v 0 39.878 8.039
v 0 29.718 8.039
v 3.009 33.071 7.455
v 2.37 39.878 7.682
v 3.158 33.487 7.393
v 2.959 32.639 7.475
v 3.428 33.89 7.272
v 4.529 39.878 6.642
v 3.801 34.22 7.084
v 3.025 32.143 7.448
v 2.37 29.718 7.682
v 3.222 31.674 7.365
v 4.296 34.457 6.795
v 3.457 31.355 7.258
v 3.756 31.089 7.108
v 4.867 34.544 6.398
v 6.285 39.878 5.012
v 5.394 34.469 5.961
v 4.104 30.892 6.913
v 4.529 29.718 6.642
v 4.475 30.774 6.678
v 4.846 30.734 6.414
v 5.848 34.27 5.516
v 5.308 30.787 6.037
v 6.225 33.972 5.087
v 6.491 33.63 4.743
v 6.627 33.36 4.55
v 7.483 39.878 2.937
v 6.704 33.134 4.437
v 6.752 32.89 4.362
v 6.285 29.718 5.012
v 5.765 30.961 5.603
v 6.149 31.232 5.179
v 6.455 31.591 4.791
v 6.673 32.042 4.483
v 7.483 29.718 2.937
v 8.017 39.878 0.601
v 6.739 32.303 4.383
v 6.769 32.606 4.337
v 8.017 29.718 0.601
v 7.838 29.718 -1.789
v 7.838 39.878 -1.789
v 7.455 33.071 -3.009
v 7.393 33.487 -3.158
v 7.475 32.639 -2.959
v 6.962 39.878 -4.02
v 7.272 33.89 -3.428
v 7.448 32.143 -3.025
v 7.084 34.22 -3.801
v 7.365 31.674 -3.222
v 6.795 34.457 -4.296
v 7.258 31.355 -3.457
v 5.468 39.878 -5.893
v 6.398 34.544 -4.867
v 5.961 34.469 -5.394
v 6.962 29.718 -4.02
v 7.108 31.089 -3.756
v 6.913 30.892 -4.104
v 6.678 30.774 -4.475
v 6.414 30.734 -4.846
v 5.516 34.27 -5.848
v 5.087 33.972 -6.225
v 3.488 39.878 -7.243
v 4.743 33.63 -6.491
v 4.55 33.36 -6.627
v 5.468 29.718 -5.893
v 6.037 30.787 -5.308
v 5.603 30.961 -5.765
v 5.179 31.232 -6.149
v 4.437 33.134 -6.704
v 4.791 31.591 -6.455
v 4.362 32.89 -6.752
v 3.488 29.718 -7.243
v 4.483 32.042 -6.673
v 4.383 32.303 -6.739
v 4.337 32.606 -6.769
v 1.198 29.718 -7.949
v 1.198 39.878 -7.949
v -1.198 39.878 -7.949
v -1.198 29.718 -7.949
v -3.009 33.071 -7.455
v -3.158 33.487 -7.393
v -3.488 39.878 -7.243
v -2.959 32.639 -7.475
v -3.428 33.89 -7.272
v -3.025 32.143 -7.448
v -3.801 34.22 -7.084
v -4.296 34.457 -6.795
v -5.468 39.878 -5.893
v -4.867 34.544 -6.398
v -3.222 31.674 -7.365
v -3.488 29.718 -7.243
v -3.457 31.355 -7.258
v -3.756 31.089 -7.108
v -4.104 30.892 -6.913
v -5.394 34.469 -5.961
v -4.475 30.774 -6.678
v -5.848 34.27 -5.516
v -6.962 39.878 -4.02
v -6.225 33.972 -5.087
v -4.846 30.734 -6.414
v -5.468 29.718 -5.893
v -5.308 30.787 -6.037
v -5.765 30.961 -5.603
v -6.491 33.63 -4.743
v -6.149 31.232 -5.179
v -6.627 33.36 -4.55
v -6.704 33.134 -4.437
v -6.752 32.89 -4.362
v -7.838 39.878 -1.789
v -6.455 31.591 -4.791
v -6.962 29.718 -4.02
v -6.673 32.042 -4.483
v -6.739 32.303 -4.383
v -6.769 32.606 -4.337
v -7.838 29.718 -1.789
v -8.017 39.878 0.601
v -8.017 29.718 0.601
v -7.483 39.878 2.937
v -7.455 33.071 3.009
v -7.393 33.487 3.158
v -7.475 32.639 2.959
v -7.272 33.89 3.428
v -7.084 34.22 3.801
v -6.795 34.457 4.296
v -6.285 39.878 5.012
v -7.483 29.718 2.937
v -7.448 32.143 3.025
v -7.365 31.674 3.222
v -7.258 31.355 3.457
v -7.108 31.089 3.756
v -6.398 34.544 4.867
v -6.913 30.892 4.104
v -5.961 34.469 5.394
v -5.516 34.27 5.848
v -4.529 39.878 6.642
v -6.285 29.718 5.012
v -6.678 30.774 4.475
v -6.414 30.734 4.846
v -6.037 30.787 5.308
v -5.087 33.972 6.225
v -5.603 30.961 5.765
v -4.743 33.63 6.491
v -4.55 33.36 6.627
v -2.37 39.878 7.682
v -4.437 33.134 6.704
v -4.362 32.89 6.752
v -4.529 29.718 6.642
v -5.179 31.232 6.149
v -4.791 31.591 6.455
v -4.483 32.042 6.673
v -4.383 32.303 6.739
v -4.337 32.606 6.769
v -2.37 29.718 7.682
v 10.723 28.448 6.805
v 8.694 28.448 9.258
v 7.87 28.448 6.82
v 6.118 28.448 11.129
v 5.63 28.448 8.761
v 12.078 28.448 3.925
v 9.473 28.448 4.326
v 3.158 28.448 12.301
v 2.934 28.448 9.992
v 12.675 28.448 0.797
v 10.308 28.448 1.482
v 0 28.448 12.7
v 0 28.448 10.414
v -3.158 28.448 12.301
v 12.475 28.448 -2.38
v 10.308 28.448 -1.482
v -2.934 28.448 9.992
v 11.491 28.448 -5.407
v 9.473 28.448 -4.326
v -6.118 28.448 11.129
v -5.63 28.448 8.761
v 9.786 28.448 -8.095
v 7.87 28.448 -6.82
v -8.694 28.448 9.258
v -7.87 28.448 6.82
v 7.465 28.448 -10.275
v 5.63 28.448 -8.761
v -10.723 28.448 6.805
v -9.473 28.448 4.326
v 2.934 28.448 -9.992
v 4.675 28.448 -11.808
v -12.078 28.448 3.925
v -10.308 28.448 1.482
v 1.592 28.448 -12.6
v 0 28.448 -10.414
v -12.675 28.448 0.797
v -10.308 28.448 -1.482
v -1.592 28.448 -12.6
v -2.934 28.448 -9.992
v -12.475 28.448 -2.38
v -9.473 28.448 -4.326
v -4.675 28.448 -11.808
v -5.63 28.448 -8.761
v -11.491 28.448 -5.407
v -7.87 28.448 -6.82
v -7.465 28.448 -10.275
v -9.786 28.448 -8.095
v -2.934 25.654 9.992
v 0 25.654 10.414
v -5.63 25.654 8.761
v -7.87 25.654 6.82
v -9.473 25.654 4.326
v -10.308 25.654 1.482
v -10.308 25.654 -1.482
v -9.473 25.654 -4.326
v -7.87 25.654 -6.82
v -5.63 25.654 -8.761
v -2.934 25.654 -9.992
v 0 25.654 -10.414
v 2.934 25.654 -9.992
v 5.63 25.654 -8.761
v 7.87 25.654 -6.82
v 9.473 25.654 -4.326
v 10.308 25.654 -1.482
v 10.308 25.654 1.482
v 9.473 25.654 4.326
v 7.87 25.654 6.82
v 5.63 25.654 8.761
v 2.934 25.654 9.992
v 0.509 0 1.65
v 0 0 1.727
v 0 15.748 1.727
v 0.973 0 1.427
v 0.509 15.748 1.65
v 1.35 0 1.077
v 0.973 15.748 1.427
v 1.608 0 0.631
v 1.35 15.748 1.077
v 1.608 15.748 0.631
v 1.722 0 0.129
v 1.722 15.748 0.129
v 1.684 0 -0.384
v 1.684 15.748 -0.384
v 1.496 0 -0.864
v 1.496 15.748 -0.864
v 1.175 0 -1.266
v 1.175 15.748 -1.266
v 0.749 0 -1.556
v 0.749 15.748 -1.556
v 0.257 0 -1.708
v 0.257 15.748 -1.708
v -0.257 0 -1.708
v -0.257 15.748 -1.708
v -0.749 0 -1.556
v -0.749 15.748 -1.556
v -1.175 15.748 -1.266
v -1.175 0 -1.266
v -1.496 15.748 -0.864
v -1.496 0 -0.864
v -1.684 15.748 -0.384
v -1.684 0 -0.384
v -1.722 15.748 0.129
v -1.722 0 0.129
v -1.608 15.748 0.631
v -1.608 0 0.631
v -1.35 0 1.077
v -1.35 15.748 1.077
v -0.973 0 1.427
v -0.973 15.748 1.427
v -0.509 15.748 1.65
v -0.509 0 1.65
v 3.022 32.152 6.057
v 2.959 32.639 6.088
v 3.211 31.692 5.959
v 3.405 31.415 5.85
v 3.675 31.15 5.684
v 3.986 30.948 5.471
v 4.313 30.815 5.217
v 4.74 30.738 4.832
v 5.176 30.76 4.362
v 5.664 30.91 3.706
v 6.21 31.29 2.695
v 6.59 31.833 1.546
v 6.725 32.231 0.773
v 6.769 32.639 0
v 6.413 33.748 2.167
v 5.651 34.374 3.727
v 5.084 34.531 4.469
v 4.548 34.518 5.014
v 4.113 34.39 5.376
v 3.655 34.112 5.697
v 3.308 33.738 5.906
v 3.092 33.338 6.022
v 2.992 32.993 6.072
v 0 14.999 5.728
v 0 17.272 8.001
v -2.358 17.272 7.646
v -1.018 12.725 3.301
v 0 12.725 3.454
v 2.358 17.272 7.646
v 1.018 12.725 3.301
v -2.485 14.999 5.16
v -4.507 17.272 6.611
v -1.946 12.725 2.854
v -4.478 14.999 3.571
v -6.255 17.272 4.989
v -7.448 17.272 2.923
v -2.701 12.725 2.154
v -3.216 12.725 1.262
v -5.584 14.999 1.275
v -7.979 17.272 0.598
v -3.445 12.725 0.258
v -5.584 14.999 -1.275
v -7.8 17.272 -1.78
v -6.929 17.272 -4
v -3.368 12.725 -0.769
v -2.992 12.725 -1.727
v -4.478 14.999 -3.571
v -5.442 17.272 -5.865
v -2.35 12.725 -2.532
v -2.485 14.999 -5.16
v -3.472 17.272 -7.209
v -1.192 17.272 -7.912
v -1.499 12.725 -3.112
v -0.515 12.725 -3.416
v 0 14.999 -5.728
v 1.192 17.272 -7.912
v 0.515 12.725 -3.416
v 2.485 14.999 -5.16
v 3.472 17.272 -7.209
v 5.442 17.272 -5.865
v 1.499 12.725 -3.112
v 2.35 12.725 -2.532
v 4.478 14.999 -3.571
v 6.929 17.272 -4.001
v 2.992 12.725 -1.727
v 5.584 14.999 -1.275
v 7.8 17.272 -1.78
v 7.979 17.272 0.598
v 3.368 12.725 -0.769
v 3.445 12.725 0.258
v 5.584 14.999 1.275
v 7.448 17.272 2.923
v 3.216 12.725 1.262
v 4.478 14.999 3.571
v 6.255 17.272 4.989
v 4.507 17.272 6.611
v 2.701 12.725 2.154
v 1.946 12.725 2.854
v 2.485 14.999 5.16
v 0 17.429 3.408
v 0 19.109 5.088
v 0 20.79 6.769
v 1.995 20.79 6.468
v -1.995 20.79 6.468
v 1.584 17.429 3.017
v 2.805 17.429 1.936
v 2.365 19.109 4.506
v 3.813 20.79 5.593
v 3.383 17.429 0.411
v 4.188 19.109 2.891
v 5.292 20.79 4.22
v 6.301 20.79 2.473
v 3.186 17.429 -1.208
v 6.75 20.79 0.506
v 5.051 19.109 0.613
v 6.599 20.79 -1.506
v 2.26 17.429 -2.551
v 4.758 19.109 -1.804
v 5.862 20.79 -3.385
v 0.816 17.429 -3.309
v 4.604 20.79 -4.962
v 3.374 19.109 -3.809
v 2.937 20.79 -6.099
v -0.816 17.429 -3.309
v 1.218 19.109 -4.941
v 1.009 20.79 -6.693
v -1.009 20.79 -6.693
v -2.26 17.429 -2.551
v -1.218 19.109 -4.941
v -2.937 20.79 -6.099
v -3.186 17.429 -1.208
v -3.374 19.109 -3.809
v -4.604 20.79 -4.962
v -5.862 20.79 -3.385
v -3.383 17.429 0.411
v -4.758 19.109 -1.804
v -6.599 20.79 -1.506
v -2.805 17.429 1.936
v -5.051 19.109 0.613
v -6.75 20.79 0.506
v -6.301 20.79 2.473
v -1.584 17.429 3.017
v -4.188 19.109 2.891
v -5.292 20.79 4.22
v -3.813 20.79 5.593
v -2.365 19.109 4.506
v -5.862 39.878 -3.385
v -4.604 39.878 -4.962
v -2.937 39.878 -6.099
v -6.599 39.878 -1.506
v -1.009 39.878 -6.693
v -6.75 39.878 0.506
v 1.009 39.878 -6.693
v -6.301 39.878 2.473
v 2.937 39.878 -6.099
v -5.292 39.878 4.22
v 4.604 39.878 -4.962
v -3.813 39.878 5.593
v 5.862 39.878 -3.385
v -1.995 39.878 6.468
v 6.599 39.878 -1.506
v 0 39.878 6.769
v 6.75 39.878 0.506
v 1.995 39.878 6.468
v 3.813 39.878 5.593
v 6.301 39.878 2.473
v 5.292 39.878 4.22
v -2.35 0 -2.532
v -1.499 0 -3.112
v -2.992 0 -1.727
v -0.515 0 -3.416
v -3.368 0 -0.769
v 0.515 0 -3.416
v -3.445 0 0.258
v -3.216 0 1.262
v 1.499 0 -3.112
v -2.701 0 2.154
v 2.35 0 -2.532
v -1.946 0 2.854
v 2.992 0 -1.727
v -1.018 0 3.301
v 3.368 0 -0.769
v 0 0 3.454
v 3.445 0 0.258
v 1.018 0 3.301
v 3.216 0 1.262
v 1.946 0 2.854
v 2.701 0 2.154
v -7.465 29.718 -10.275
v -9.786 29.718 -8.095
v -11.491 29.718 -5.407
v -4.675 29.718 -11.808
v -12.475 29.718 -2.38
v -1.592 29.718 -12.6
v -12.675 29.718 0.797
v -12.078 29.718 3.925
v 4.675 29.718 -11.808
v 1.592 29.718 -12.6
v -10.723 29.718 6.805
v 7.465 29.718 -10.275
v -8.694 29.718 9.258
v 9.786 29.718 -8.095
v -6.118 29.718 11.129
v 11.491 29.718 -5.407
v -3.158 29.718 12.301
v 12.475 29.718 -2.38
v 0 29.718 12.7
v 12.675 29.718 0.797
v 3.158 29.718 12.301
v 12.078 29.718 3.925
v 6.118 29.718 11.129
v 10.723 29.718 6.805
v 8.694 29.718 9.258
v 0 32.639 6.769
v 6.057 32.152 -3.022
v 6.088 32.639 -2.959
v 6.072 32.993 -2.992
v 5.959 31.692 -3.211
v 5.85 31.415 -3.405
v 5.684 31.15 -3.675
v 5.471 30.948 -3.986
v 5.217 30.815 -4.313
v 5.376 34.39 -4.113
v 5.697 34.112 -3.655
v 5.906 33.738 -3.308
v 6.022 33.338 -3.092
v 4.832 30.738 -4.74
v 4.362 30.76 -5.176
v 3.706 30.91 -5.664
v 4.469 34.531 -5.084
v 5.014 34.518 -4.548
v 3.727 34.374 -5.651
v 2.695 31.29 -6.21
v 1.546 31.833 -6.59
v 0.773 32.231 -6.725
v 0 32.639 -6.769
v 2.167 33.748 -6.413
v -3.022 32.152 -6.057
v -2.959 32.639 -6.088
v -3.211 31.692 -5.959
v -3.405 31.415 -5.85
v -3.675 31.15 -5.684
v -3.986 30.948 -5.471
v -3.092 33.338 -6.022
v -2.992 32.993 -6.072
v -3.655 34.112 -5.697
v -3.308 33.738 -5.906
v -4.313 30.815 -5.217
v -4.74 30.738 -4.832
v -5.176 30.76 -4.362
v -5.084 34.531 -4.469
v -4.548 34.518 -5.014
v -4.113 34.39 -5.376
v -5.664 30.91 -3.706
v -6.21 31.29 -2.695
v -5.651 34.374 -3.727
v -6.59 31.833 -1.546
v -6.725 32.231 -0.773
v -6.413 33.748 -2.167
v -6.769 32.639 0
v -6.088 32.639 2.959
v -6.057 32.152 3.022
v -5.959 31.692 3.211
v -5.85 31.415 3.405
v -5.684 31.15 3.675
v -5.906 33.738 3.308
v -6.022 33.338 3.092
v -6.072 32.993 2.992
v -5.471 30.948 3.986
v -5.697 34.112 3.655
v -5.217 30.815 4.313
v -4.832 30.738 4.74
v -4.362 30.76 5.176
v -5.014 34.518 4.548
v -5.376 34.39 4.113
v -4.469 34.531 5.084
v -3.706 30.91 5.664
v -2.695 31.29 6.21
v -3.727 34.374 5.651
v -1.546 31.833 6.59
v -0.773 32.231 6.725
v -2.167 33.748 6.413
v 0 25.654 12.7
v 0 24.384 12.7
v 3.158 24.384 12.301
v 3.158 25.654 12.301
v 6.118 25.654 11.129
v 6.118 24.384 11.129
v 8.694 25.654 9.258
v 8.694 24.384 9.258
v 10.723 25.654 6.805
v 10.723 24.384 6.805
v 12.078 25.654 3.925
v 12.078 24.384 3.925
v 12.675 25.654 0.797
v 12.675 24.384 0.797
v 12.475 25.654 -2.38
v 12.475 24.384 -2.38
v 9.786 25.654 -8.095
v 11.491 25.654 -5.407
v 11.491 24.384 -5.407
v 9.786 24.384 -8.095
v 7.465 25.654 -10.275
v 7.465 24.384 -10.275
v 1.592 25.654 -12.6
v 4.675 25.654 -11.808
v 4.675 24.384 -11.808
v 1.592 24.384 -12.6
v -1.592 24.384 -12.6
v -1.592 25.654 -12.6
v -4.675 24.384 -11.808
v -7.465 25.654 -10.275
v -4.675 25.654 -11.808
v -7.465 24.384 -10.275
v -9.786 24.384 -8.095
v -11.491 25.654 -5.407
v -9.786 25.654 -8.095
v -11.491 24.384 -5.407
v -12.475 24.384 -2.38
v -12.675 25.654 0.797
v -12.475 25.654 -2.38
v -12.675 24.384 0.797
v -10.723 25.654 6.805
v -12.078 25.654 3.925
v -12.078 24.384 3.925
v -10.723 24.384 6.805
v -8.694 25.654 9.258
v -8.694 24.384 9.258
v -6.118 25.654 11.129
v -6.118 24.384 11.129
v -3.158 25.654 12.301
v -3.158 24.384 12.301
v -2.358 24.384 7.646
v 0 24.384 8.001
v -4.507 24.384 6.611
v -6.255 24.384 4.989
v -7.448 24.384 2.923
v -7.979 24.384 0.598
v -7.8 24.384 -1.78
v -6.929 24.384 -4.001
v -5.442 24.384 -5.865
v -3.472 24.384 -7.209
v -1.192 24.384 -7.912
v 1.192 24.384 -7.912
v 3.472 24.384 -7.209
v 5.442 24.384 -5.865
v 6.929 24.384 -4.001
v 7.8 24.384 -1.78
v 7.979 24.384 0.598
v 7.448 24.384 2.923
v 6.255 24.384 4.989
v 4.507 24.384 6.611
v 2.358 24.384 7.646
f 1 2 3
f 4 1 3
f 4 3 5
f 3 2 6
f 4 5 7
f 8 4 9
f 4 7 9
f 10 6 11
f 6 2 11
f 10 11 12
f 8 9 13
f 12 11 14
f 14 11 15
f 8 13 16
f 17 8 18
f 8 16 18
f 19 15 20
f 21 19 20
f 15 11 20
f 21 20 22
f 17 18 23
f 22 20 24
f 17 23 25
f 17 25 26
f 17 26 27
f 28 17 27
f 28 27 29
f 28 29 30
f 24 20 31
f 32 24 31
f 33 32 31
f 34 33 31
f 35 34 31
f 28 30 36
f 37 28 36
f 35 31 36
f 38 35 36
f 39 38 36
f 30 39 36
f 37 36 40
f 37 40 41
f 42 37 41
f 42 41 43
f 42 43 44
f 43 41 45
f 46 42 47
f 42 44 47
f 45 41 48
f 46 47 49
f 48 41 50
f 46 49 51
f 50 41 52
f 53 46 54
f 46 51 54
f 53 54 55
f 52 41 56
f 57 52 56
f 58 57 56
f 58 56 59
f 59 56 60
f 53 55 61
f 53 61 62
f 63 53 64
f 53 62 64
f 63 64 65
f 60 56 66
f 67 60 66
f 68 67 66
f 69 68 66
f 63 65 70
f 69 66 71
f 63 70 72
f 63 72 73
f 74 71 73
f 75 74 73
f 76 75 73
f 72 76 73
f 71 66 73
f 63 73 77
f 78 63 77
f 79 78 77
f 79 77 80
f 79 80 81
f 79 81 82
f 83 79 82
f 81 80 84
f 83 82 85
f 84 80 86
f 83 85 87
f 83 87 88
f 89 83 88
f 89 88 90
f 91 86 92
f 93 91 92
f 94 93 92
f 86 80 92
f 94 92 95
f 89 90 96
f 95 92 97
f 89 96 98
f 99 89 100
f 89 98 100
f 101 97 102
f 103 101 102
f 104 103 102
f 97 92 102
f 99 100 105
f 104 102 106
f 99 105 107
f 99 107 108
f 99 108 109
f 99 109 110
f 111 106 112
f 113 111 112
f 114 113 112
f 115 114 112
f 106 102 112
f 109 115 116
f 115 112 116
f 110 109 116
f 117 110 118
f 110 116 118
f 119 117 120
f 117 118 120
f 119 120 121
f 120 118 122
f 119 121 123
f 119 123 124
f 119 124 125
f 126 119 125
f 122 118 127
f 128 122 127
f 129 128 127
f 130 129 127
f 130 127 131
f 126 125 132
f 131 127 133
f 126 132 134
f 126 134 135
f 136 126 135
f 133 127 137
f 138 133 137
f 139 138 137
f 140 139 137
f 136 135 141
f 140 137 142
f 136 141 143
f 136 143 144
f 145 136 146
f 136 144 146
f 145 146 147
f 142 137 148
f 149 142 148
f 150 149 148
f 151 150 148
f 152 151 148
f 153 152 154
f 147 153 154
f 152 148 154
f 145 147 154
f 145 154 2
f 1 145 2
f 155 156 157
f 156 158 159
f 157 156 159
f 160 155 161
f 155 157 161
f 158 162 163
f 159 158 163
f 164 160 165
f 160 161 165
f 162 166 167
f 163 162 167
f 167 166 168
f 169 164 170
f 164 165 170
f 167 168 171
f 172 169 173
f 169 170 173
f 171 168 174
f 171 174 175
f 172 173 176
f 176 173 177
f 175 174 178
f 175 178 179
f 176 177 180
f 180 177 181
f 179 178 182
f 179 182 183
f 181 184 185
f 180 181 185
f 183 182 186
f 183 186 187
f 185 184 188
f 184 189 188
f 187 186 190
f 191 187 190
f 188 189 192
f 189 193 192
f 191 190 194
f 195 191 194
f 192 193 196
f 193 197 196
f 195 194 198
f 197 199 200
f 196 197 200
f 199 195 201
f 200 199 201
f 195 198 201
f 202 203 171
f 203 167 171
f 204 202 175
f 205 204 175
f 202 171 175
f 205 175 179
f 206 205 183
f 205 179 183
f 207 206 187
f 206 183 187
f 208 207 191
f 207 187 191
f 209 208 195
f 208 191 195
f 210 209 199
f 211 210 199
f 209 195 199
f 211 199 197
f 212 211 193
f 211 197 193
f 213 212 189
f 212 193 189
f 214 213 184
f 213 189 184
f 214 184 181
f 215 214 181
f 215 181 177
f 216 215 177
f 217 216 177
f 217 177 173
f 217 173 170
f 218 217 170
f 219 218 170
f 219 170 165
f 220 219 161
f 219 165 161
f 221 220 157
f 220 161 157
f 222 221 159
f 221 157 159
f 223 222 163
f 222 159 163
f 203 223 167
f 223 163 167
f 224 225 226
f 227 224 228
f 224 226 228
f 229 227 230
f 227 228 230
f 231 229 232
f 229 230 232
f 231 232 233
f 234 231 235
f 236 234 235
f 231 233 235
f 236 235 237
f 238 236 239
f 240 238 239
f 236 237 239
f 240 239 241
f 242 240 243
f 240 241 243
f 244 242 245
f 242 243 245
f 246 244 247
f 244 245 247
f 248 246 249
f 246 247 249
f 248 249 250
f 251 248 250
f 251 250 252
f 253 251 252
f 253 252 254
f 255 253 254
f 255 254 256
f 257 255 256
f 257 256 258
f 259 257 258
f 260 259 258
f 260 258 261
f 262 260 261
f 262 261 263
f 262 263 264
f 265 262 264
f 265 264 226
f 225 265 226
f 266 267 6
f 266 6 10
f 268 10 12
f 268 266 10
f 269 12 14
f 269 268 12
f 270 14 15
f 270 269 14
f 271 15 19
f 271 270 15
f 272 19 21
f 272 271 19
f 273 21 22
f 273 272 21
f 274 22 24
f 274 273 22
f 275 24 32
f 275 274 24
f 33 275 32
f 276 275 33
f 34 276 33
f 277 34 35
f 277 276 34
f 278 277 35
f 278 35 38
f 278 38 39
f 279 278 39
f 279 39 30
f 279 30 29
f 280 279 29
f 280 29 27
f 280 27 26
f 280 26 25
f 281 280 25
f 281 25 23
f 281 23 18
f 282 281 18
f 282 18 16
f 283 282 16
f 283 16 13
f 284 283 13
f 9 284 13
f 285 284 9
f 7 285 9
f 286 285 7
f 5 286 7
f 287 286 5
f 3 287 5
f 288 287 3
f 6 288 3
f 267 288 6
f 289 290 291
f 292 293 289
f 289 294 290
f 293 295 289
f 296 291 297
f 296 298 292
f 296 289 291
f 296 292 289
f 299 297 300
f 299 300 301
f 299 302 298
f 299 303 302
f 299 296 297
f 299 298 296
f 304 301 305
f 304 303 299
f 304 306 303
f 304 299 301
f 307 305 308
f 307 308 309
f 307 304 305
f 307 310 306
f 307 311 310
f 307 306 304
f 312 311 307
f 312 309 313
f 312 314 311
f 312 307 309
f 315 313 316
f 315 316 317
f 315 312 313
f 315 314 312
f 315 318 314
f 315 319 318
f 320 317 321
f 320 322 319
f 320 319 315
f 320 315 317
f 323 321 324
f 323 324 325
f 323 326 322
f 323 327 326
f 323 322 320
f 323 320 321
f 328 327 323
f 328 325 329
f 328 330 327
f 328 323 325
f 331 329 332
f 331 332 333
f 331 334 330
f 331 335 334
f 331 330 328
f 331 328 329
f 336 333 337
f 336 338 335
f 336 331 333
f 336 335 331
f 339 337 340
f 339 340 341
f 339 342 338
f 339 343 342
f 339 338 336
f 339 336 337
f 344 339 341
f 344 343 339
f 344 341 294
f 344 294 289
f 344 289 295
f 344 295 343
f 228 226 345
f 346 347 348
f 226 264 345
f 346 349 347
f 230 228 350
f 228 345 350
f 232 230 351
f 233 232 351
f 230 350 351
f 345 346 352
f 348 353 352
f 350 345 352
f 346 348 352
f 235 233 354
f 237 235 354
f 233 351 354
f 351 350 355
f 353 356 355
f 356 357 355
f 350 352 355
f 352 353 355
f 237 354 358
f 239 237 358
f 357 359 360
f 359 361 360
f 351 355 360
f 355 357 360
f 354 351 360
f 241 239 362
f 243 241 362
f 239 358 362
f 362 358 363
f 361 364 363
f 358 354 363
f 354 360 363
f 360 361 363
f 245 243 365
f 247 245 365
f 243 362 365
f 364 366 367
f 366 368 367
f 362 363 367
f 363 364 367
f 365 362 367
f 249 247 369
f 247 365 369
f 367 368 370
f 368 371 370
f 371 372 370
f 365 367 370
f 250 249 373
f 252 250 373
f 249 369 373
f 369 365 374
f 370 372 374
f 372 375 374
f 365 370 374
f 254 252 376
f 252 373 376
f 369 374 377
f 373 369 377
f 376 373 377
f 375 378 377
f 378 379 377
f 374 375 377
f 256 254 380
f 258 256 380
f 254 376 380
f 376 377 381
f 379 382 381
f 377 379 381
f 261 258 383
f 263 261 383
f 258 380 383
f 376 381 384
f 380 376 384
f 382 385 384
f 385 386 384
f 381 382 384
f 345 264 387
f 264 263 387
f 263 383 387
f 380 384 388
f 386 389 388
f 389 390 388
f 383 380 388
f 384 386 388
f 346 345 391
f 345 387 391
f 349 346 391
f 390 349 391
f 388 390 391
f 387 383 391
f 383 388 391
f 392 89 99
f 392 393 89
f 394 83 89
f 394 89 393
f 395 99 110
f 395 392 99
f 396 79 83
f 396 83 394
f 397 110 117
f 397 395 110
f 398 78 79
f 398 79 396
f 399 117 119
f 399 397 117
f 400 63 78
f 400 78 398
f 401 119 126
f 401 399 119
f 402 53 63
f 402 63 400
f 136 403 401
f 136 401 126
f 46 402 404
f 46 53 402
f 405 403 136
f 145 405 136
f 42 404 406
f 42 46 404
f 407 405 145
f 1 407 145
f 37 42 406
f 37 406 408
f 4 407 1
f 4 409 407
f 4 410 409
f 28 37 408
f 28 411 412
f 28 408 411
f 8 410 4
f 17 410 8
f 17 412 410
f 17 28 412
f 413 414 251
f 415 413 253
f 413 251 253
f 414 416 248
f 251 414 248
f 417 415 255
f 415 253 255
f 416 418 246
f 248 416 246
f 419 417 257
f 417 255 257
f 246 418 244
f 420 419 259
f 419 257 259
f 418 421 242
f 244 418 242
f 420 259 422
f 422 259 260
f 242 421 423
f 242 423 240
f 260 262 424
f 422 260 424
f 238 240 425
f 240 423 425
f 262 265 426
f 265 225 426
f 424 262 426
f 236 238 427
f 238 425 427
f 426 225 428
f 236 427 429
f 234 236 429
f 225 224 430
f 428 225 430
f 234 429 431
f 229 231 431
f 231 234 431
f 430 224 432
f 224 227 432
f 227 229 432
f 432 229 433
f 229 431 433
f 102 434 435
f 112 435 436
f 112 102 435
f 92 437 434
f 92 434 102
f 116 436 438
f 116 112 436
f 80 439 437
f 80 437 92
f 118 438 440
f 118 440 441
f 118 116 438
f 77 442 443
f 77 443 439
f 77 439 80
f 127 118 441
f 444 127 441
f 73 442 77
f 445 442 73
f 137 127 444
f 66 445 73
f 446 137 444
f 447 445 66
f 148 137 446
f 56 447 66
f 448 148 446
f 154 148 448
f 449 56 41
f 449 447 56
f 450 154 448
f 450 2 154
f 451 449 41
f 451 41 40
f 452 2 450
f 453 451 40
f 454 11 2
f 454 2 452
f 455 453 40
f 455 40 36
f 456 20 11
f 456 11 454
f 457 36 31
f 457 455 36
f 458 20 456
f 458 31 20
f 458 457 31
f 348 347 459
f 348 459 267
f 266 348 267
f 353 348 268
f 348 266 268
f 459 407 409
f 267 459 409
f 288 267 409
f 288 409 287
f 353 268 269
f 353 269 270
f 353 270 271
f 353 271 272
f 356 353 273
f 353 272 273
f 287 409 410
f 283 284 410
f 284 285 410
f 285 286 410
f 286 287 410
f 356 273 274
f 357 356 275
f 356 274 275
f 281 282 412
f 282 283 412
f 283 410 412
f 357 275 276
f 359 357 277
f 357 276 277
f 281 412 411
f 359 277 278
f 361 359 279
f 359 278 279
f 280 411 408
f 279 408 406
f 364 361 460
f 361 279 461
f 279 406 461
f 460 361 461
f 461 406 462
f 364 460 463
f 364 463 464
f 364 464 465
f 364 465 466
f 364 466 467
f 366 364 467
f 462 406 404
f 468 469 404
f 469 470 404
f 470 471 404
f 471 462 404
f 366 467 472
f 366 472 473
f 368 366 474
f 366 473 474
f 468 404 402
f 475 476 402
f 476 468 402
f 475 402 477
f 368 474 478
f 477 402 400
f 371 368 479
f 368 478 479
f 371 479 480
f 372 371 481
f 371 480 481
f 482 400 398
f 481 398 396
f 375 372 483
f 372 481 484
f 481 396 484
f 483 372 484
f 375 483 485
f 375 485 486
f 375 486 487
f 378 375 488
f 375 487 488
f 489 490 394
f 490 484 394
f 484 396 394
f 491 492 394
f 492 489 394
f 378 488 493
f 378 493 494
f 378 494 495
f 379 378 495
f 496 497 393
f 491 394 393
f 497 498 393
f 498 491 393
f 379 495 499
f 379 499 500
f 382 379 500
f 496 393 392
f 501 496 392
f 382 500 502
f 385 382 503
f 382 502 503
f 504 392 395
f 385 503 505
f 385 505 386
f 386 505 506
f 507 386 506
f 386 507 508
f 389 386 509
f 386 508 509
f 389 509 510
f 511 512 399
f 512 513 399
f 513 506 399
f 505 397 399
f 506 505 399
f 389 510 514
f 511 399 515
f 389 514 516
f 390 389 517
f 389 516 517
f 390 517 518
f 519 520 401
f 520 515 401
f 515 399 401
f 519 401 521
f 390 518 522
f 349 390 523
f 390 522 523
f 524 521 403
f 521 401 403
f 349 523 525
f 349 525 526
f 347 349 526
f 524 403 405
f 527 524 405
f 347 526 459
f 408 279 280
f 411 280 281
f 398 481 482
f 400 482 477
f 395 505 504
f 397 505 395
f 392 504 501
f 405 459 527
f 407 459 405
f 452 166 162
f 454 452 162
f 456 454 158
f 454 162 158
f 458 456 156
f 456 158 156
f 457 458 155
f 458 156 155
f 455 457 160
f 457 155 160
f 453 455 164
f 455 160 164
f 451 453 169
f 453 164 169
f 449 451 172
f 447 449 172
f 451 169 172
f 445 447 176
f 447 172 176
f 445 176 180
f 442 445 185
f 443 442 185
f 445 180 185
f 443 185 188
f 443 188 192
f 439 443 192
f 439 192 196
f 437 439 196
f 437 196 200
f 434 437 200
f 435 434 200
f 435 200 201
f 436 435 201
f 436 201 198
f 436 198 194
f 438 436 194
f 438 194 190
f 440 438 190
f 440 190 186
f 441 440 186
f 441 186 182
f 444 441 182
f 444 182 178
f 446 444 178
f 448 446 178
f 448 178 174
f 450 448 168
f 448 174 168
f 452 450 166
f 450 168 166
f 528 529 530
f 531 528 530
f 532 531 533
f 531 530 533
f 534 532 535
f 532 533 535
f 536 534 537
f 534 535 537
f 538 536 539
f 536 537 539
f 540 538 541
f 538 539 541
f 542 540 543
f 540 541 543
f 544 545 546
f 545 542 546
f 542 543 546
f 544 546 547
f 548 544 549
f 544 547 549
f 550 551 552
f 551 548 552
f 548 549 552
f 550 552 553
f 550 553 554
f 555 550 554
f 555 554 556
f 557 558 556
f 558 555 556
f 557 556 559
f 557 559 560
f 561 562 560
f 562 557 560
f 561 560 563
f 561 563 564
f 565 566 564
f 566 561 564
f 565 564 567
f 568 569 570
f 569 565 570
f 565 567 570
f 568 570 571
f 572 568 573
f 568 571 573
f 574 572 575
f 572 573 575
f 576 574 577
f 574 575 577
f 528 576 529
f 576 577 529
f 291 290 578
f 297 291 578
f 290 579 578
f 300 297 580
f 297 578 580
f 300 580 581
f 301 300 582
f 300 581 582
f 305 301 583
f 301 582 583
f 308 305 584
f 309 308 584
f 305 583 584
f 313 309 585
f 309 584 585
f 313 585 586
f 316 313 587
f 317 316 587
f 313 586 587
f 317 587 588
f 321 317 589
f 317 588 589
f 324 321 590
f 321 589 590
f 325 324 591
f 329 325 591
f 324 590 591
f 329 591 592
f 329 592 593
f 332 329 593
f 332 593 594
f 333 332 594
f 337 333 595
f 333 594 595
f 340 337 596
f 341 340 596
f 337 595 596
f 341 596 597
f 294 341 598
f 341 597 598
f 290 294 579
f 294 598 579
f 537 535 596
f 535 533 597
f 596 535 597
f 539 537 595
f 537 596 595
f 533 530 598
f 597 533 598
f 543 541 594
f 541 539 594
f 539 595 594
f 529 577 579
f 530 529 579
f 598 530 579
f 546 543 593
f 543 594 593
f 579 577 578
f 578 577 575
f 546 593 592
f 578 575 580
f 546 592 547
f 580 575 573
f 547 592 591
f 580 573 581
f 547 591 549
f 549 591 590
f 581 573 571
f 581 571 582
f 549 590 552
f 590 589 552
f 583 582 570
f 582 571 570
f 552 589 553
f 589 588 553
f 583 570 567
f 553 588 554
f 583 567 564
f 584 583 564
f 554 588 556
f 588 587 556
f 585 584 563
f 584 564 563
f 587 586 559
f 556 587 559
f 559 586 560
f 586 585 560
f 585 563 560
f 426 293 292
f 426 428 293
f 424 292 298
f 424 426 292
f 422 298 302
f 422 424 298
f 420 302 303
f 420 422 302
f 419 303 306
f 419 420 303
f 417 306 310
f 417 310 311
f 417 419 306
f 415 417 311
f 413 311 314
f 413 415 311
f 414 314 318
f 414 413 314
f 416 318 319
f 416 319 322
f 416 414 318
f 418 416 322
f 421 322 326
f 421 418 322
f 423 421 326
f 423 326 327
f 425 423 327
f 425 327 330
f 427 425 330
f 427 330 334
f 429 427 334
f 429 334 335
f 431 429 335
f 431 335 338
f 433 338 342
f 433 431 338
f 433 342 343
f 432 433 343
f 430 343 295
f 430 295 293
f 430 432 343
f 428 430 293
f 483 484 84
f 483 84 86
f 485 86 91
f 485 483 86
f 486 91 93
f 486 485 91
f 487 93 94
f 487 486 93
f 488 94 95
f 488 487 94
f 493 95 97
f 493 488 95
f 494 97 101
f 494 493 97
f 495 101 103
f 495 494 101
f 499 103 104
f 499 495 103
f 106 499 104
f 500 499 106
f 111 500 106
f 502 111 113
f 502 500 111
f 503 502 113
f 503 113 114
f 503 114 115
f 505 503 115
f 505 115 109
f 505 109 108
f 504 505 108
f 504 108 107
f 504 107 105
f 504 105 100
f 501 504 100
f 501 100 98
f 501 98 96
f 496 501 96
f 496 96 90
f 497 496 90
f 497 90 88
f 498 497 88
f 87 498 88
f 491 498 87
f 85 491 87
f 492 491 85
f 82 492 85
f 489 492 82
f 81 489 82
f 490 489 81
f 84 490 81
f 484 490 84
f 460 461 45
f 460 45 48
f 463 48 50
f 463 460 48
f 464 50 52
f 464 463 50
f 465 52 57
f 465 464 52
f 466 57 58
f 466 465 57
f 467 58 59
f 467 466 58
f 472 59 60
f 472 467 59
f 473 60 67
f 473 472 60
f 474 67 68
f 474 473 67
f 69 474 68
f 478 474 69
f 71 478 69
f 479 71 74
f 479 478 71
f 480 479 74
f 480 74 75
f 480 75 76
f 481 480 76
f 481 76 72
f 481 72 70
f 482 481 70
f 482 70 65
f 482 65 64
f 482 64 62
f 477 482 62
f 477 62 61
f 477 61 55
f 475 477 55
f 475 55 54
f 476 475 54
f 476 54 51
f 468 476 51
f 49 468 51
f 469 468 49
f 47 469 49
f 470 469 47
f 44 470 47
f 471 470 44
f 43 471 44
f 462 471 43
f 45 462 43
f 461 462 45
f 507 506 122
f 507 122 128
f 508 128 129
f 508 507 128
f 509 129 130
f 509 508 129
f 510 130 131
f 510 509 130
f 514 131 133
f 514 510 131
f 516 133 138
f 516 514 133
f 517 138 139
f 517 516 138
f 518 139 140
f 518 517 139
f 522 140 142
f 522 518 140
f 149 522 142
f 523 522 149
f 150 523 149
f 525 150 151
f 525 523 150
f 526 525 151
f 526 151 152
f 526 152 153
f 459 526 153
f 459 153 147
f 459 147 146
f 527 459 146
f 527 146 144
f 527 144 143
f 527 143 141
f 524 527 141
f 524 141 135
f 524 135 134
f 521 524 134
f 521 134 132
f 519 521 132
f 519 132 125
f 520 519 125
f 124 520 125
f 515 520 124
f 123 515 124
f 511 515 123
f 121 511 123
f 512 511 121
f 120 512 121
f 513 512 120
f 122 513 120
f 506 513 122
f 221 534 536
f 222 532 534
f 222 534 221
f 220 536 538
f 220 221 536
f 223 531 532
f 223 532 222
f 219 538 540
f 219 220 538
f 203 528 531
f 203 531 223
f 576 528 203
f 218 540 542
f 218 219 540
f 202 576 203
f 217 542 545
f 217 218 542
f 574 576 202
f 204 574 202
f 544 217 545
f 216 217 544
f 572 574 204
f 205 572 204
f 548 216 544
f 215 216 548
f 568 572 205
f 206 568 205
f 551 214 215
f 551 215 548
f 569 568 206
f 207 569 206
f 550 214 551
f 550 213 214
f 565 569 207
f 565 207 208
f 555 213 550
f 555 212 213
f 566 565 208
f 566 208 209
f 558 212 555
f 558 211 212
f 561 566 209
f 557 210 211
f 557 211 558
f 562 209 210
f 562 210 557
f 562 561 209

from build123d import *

# Parameters (mm, degrees)
SKETCH2_R                = 12.7
SOLID_CYLINDER_DEPTH     = 39.878
ALL_THROUGH_HOLE_REACH   = 45.736
SKETCH3_R                = 1.7272
SKETCH4_R                = 6.7691
SWIRL_CHAMBER_DEPTH      = 19.05
TOP_START                = -10.16
SKETCH5_R                = 12.7
SKETCH5_R_2              = 8.0391
TOP_OUTER_CUT_DEPTH      = 10.16
SKETCH8_W                = 2.286
SKETCH8_H                = 2.794
SKETCH9_W                = 4.699
SKETCH9_H                = 24.384
INNER_CHAMFER_SIZE       = 5.08
INLET_HOLE_REACH         = 45.736
INLET_HOLE_END_RADIUS    = 8.0391
SKETCH12_R               = 1.905
INLET_HOLE_PATTERN_COUNT = 4


with BuildPart() as part:
    # Sketch2 → Solid Cylinder (new body)
    with BuildSketch(Plane(origin=(0, 0, 0), x_dir=(1, 0, 0), z_dir=(0, 1, 0))):
        with Locations(Location((0, 0, 0), (0, 0, 270))):
            Circle(SKETCH2_R)
    extrude(amount=SOLID_CYLINDER_DEPTH)

    # Sketch3 → All Through Hole (cut, up to next)
    with BuildSketch(Plane(origin=(0, 39.878, 0), x_dir=(1, 0, 0), z_dir=(0, 1, 0)), mode=Mode.PRIVATE) as all_through_hole_sk1:
        with Locations(Location((0, 0, 0), (0, 0, 270))):
            Circle(SKETCH3_R)
    all_through_hole_tool1 = extrude(all_through_hole_sk1.sketch, amount=-ALL_THROUGH_HOLE_REACH, mode=Mode.PRIVATE) & part.part
    add(all_through_hole_tool1.solids().sort_by_distance((0, 39.878, 0))[0], mode=Mode.SUBTRACT)

    # Sketch4 → Swirl Chamber (cut)
    with BuildSketch(Plane(origin=(0, 39.878, 0), x_dir=(1, 0, 0), z_dir=(0, 1, 0))):
        with Locations(Location((0, 0, 0), (0, 0, 270))):
            Circle(SKETCH4_R)
    extrude(amount=-SWIRL_CHAMBER_DEPTH, mode=Mode.SUBTRACT)

    # Sketch5 → Top Outer cut (cut)
    with BuildSketch(Plane(origin=(0, 39.878, 0), x_dir=(1, 0, 0), z_dir=(0, 1, 0)).offset(TOP_START)):
        with Locations(Location((0, 0, 0), (0, 0, 270))):
            Circle(SKETCH5_R)
        with Locations(Location((0, 0, 0), (0, 0, 270))):
            Circle(SKETCH5_R_2, mode=Mode.SUBTRACT)
    extrude(amount=TOP_OUTER_CUT_DEPTH, mode=Mode.SUBTRACT)

    # Sketch8 → O Ring Cut (revolve, cut)
    with BuildSketch(Plane.XY, mode=Mode.PRIVATE) as o_ring_cut_sk:
        with Locations((11.557, 27.051)):
            Rectangle(SKETCH8_W, SKETCH8_H)
    revolve(o_ring_cut_sk.sketch.rotate(Axis((0, 55, 0), (0, -1, 0)), 90), axis=Axis((0, 55, 0), (0, -1, 0)), mode=Mode.SUBTRACT)

    # Sketch9 → Base Support (revolve, cut)
    with BuildSketch(Plane.XY, mode=Mode.PRIVATE) as base_support_sk:
        with Locations((10.3505, 12.192)):
            Rectangle(SKETCH9_W, SKETCH9_H)
    revolve(base_support_sk.sketch.rotate(Axis((0, 55, 0), (0, -1, 0)), 90), axis=Axis((0, 55, 0), (0, -1, 0)), mode=Mode.SUBTRACT)

    # Inner Chamfer
    # the kernel refuses this chamfer: 5.08 mm, written as the material it takes off along each edge
    with BuildSketch(Plane(origin=(0, 20.828, 0), x_dir=(0, 0, 1), z_dir=(-1, 0, 0))) as inner_chamfer_piece_1_section:
        Polygon((1.7272, -INNER_CHAMFER_SIZE), (1.7272 + INNER_CHAMFER_SIZE, 0), (1.7272, 0), align=None)
    inner_chamfer_piece_1 = revolve(axis=Axis((0, 20.828, 0), (0, 1, 0)), mode=Mode.PRIVATE)
    inner_chamfer_piece_1 = inner_chamfer_piece_1 & Plane(origin=(0, 18.244555095, 0), x_dir=(0, 0, 1), z_dir=(0, 1, 0)) * Cylinder(6.7691, 28, mode=Mode.PRIVATE)
    add(inner_chamfer_piece_1, mode=Mode.SUBTRACT)

    # Inlet Hole: up to this cylinder (the profile starts inside it)
    inlet_hole_end = Plane(origin=(0, 32.639, 0), z_dir=(0, 1, 0)) * Cylinder(INLET_HOLE_END_RADIUS, 108.5502, mode=Mode.PRIVATE)
    # Sketch12 → Inlet Hole (cut, up to the surface)
    with BuildSketch(Plane.XY, mode=Mode.PRIVATE) as inlet_hole_sk1:
        with Locations(Location((4.8641, 32.639, 0), (0, 0, 180))):
            Circle(SKETCH12_R)
    inlet_hole_tool1 = extrude(inlet_hole_sk1.sketch, amount=INLET_HOLE_REACH, mode=Mode.PRIVATE) & inlet_hole_end
    inlet_hole = inlet_hole_tool1.solids().sort_by_distance((4.8641, 32.639, 0))[0]
    add(inlet_hole, mode=Mode.SUBTRACT)

    # Inlet Hole Pattern: Inlet Hole ×4 about axis
    inlet_hole_pattern_axis = Axis((0, 55, 0), (0, -1, 0))
    for i in range(1, INLET_HOLE_PATTERN_COUNT):
        add(inlet_hole.rotate(inlet_hole_pattern_axis, i * 360 / INLET_HOLE_PATTERN_COUNT), mode=Mode.SUBTRACT)

    # Sketch13 → Outer Chamfer and Stem (revolve, cut)
    with BuildSketch(Plane.XY, mode=Mode.PRIVATE) as outer_chamfer_and_stem_sk:
        Polygon((-8.001, 17.272), (-3.4544, 12.7254), (-3.4544, 0), (-8.001, 0), align=None)
    revolve(outer_chamfer_and_stem_sk.sketch.rotate(Axis((0, 46.59080533, 0), (0, -1, 0)), 270), axis=Axis((0, 46.59080533, 0), (0, -1, 0)), mode=Mode.SUBTRACT)


solid = part.part
